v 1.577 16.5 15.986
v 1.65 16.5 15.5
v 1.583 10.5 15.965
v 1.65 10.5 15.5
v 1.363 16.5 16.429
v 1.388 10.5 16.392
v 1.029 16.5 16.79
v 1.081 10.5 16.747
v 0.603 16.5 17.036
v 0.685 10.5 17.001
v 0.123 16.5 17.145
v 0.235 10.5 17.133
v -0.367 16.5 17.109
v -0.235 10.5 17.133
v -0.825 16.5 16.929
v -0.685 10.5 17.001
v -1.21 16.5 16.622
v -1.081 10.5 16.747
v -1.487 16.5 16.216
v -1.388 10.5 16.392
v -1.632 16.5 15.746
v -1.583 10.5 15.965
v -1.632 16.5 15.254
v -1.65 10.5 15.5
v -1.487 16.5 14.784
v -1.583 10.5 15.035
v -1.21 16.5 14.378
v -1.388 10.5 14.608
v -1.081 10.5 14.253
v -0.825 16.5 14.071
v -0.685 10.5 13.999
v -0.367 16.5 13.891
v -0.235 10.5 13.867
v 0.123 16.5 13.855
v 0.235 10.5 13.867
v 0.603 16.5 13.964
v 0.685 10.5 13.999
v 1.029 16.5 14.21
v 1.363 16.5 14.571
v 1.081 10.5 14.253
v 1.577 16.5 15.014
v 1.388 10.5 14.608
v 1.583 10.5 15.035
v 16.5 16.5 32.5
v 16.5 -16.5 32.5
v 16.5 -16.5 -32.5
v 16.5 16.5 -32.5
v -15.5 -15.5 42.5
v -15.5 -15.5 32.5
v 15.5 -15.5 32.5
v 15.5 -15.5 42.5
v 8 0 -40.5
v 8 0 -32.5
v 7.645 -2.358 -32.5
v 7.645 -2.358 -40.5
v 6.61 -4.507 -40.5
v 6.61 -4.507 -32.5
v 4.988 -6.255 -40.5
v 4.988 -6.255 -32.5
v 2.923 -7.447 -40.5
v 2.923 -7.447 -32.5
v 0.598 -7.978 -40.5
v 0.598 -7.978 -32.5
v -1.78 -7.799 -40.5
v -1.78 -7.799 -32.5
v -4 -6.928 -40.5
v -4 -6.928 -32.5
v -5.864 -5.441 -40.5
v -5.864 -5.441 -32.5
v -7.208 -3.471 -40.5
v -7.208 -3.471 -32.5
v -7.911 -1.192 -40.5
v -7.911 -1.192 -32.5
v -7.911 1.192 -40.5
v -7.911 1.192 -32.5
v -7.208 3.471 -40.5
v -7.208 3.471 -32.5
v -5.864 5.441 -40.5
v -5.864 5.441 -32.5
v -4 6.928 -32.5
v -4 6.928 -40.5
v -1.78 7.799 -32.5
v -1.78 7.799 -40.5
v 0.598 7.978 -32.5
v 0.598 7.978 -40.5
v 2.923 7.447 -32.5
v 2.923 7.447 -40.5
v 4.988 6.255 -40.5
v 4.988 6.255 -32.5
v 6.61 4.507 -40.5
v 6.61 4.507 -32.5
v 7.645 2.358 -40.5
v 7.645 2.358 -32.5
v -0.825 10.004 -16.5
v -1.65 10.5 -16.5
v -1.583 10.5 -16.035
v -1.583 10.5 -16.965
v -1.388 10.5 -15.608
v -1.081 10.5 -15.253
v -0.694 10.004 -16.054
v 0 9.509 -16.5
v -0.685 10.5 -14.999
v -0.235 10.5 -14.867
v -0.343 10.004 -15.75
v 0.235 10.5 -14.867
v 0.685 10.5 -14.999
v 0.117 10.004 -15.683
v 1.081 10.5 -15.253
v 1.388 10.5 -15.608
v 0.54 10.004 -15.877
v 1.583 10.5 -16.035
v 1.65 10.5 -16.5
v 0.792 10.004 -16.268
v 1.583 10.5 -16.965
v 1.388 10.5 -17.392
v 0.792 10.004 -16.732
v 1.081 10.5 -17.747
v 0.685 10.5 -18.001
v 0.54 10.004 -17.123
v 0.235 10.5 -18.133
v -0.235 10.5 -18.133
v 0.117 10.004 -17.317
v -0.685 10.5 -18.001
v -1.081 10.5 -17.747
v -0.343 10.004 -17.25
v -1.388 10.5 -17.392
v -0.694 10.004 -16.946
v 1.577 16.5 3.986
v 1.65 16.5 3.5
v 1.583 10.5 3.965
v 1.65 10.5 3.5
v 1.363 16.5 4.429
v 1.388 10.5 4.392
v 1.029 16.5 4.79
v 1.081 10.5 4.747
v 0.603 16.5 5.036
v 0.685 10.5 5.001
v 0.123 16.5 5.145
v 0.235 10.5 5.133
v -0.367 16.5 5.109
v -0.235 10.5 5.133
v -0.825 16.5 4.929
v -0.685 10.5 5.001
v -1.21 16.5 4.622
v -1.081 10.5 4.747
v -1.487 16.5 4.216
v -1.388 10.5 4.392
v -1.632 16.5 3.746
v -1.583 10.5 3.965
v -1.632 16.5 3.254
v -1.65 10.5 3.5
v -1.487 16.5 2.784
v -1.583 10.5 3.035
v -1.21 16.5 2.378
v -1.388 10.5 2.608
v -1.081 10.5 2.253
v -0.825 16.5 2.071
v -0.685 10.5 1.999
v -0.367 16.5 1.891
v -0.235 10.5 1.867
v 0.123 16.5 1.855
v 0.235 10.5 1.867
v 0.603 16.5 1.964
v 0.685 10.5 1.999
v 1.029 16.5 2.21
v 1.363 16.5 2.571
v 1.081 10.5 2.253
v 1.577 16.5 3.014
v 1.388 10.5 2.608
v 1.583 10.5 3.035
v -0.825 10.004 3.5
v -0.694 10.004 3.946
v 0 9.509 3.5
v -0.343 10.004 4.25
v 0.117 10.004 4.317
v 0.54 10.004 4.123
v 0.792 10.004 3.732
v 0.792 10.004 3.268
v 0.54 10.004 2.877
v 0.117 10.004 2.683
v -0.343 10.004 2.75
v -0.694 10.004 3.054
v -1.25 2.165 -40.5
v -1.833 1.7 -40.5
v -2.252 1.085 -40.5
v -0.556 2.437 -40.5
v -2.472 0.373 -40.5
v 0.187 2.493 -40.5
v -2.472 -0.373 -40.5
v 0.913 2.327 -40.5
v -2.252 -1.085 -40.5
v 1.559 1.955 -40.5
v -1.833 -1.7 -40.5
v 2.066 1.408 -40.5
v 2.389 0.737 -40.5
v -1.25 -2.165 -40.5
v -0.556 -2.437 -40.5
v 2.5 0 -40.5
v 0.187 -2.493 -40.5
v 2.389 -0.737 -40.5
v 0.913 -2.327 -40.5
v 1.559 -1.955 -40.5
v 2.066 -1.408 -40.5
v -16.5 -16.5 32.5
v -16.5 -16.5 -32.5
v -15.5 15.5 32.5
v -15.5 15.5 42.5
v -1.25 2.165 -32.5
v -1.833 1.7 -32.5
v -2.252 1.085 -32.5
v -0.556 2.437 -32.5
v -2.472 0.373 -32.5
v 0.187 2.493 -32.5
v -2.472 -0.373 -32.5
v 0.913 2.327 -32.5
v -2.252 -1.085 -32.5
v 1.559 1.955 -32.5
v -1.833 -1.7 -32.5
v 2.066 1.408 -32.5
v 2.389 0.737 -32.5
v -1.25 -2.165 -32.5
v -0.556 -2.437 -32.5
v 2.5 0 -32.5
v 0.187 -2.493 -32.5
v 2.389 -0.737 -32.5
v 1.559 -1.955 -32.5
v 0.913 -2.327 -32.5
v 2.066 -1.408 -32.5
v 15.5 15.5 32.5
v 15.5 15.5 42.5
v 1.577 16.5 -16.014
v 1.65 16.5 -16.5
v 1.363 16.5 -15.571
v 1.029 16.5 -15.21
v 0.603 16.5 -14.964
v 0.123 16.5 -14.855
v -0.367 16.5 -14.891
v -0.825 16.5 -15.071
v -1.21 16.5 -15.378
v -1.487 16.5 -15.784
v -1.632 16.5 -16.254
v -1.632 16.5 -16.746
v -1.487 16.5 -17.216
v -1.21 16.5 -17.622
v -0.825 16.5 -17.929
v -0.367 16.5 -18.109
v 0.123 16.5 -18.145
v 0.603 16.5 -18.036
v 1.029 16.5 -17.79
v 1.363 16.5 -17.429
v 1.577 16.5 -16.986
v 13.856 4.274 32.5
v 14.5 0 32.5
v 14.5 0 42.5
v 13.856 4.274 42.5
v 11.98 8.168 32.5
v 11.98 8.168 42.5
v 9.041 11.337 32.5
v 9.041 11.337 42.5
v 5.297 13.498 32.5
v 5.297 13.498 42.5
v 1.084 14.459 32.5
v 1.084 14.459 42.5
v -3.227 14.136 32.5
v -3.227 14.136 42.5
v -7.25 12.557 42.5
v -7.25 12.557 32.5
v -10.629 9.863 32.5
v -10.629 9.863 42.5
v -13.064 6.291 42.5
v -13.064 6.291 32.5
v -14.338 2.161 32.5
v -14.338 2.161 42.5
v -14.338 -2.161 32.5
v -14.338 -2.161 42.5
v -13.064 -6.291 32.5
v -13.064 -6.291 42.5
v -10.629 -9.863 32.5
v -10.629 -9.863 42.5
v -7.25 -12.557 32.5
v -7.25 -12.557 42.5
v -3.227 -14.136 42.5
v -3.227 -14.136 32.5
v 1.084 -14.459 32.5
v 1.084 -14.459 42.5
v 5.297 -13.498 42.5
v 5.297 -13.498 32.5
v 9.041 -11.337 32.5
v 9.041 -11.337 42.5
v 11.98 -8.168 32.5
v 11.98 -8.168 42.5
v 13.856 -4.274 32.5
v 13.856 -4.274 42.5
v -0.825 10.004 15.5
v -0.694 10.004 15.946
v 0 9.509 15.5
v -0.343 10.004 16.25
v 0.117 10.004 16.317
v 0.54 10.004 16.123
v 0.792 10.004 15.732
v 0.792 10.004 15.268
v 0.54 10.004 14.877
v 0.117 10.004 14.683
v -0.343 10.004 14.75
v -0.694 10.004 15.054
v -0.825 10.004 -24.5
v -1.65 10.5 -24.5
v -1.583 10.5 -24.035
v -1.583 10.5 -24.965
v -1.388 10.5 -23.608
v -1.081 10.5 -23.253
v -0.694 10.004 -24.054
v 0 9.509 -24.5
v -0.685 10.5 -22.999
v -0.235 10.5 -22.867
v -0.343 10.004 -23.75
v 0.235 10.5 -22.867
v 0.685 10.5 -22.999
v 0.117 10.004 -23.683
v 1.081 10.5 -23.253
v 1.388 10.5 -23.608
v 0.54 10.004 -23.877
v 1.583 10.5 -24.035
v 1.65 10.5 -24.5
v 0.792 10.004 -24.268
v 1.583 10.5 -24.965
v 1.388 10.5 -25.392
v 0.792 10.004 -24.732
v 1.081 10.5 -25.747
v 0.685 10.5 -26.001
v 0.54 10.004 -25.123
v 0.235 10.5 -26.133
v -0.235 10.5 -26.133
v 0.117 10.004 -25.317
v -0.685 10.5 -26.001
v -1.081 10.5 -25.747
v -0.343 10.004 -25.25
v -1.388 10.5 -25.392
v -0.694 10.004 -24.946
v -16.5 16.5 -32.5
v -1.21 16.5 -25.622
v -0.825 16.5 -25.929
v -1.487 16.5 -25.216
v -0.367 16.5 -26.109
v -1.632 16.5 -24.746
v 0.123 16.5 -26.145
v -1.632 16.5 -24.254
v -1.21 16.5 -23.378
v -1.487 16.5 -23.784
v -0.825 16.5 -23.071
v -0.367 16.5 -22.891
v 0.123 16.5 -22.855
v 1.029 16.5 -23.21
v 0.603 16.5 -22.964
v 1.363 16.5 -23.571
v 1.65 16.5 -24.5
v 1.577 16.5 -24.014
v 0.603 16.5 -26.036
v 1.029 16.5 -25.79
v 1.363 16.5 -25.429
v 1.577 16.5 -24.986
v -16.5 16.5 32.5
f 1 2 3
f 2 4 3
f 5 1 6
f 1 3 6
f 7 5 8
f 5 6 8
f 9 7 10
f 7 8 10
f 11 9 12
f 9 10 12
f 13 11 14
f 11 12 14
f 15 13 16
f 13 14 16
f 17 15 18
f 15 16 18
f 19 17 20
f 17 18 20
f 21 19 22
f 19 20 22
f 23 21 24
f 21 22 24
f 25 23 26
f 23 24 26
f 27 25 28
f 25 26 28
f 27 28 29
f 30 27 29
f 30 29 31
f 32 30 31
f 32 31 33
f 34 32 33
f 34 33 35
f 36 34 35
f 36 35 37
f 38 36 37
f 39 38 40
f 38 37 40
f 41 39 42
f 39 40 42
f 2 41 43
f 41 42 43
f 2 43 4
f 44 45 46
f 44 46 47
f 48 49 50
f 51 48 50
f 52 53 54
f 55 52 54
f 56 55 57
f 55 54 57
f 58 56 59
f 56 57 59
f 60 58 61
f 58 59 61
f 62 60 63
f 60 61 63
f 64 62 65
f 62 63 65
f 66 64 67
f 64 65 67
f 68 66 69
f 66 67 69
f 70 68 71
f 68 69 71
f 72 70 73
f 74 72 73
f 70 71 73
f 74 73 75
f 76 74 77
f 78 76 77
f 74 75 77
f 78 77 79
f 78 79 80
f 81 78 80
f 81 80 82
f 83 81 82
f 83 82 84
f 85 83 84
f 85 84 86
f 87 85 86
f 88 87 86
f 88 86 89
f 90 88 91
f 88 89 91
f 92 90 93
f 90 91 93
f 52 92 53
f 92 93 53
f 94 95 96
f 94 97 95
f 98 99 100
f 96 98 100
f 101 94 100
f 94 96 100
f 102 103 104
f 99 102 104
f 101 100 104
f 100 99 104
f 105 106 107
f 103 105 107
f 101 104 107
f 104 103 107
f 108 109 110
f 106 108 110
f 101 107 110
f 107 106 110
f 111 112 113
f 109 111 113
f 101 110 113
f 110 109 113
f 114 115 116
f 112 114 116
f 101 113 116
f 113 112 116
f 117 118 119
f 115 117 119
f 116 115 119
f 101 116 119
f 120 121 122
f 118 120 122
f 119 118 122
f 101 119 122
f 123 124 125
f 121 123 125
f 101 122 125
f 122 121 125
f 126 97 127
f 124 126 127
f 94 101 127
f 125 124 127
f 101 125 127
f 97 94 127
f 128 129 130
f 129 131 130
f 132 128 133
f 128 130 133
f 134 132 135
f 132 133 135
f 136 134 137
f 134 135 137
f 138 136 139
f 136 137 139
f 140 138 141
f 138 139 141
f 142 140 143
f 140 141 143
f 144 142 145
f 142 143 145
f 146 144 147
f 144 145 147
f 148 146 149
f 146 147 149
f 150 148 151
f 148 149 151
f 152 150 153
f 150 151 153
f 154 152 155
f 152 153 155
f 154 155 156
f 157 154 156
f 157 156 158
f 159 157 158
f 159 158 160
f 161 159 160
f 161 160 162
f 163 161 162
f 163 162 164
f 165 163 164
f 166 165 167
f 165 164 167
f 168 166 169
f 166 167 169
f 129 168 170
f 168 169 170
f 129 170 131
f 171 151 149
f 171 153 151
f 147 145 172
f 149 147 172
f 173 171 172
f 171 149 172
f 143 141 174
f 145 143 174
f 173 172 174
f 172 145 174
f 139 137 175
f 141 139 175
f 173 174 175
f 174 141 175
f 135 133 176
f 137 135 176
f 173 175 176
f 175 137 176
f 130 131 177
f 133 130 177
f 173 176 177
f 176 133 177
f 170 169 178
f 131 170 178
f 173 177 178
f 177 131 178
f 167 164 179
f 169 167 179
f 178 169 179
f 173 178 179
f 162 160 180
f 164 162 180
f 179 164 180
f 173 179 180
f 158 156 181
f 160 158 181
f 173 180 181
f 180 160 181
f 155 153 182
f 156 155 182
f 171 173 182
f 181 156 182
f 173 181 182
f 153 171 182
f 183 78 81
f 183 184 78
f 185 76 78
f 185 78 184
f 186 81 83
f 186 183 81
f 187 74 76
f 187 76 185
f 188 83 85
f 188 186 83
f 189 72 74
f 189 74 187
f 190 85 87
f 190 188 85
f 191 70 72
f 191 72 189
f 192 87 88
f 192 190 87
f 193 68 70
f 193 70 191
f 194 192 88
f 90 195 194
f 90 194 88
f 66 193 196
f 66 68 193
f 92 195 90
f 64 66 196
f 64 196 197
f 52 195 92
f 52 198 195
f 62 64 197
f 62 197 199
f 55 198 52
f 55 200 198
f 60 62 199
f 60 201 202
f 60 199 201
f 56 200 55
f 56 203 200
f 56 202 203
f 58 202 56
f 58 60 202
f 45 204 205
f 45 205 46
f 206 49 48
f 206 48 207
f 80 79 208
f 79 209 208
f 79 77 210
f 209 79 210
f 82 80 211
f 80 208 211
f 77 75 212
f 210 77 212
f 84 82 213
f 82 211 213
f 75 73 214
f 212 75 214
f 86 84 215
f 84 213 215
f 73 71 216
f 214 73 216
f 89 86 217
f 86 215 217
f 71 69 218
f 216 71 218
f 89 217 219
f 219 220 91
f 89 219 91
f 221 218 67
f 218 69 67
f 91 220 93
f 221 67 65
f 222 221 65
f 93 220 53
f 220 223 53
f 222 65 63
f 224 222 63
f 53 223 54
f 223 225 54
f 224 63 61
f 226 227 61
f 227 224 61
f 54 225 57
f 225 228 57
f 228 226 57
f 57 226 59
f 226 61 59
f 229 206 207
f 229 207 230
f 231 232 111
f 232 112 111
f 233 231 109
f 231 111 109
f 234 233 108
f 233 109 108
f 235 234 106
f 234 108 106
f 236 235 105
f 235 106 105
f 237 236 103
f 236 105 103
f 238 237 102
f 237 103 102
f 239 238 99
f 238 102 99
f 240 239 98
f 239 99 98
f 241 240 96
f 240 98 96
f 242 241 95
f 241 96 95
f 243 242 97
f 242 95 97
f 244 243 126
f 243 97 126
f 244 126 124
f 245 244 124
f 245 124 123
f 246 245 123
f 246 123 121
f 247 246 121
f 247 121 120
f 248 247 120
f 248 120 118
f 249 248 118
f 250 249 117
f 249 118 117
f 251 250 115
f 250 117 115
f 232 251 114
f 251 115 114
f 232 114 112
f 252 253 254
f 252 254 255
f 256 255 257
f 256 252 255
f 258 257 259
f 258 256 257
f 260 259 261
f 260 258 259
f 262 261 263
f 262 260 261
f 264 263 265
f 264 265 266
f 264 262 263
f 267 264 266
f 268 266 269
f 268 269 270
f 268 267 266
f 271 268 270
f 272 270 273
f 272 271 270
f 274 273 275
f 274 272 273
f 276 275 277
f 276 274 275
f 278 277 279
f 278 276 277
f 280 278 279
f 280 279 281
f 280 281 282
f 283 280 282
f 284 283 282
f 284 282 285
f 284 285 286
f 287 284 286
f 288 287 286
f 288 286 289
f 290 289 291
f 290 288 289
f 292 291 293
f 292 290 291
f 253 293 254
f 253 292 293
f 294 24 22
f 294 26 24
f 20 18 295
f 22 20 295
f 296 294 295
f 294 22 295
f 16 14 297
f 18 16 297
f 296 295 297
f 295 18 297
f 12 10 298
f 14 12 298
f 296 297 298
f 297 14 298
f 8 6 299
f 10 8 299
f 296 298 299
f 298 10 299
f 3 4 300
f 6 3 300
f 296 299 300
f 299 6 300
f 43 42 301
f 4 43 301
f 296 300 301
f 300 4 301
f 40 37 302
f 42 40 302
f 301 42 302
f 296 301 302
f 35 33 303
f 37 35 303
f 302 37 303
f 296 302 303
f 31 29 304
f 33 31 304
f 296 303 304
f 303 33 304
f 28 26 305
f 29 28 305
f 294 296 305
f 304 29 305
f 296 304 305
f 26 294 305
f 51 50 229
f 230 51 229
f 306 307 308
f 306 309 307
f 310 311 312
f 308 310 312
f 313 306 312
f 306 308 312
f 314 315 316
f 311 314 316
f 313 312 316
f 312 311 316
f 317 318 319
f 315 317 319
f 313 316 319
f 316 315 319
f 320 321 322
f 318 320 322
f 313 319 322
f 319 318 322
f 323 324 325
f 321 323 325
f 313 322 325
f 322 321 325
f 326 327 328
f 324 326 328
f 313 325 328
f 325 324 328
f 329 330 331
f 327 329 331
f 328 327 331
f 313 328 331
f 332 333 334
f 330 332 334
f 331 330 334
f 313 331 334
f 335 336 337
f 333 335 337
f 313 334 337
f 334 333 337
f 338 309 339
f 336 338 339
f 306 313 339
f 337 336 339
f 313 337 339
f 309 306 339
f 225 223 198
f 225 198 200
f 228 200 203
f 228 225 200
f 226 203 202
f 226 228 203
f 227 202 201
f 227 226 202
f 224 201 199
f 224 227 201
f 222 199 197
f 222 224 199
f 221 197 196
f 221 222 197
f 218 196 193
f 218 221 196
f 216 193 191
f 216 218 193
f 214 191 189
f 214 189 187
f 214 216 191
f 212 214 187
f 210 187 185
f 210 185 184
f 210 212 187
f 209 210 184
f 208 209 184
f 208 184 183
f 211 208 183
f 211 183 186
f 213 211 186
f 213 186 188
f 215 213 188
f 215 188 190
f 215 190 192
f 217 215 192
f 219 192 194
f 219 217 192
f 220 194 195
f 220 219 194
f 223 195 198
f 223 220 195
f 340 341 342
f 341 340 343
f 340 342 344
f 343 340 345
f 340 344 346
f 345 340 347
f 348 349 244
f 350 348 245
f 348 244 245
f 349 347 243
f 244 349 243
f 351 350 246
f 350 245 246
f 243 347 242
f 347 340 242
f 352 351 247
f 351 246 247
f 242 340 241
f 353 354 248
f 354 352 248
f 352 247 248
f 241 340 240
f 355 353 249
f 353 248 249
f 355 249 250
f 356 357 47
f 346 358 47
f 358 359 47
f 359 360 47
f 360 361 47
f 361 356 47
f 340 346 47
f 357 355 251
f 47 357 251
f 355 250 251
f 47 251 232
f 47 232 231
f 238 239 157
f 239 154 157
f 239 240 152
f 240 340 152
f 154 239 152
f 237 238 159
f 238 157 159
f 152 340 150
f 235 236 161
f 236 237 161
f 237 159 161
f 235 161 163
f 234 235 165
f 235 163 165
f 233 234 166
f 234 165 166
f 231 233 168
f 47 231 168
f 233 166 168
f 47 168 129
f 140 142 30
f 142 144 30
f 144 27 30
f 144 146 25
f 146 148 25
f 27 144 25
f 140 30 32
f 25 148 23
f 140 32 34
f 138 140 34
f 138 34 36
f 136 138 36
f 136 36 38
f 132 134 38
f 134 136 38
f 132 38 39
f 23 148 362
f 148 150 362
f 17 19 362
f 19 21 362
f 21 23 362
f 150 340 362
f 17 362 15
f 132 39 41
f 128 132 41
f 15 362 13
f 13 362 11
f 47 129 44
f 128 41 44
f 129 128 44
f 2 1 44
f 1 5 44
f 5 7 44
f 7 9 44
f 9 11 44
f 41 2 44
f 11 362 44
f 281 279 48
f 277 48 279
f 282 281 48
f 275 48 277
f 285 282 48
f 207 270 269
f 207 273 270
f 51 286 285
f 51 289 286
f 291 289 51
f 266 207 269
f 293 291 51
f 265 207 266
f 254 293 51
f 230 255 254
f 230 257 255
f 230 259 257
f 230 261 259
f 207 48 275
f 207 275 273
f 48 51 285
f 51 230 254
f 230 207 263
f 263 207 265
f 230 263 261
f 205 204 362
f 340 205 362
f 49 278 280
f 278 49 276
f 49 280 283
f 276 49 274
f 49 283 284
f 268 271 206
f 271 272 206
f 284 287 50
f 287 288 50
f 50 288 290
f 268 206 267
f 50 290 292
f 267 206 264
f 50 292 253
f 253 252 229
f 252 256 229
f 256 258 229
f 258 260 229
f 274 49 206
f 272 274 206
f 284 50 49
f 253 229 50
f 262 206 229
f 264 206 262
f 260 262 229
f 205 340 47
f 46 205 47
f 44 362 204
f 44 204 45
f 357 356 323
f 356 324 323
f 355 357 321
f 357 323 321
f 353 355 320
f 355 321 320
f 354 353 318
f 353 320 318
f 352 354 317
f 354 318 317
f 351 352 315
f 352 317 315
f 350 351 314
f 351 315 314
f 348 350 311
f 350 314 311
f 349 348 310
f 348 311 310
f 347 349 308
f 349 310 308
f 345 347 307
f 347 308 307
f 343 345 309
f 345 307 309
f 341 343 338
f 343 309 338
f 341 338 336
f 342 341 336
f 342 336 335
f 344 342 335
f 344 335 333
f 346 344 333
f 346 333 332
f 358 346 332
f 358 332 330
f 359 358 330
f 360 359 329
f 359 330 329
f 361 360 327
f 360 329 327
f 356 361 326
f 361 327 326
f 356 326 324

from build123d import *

# Parameters (mm, degrees)
F0_W     = 33
F0_H     = 33
F1_DEPTH = 32.5
F2_R     = 8
F2_R_2   = 2.5
F3_DEPTH = 8
F4_W     = 31
F4_H     = 31
F4_R     = 14.5
F5_DEPTH = 10
F7_D     = 3.3
F7_DEPTH = 6
F7_TIP   = 0.9914200214


with BuildPart() as f1:
    # F0 (on Top) → F1 (new body, symmetric)
    with BuildSketch(Plane.XY):
        Rectangle(F0_W, F0_H)
    extrude(amount=F1_DEPTH, both=True)

    # F7
    with Locations(Plane(origin=(0, 16.5, 0), x_dir=(-1, 0, 0), z_dir=(0, 1, 0))):
        with Locations((0, 15.5), (0, 3.5), (0, -16.5), (0, -24.5)):
            Hole(F7_D / 2, depth=F7_DEPTH)
            with Locations((0, 0, -(F7_DEPTH + F7_TIP / 2))):  # 118° drill point
                Cone(0, F7_D / 2, F7_TIP, mode=Mode.SUBTRACT)


with BuildPart() as f3:
    # F2 (on face) → F3 (new body)
    with BuildSketch(Plane(origin=(0, 0, -32.5), x_dir=(1, 0, 0), z_dir=(0, 0, -1))):
        Circle(F2_R)
        Circle(F2_R_2, mode=Mode.SUBTRACT)
    extrude(amount=F3_DEPTH)


with BuildPart() as f5:
    # F4 (on face) → F5 (new body)
    with BuildSketch(Plane.XY.offset(32.5)):
        Rectangle(F4_W, F4_H)
        Circle(F4_R, mode=Mode.SUBTRACT)
    extrude(amount=F5_DEPTH)


solid = Compound([f1.part, f3.part, f5.part])
